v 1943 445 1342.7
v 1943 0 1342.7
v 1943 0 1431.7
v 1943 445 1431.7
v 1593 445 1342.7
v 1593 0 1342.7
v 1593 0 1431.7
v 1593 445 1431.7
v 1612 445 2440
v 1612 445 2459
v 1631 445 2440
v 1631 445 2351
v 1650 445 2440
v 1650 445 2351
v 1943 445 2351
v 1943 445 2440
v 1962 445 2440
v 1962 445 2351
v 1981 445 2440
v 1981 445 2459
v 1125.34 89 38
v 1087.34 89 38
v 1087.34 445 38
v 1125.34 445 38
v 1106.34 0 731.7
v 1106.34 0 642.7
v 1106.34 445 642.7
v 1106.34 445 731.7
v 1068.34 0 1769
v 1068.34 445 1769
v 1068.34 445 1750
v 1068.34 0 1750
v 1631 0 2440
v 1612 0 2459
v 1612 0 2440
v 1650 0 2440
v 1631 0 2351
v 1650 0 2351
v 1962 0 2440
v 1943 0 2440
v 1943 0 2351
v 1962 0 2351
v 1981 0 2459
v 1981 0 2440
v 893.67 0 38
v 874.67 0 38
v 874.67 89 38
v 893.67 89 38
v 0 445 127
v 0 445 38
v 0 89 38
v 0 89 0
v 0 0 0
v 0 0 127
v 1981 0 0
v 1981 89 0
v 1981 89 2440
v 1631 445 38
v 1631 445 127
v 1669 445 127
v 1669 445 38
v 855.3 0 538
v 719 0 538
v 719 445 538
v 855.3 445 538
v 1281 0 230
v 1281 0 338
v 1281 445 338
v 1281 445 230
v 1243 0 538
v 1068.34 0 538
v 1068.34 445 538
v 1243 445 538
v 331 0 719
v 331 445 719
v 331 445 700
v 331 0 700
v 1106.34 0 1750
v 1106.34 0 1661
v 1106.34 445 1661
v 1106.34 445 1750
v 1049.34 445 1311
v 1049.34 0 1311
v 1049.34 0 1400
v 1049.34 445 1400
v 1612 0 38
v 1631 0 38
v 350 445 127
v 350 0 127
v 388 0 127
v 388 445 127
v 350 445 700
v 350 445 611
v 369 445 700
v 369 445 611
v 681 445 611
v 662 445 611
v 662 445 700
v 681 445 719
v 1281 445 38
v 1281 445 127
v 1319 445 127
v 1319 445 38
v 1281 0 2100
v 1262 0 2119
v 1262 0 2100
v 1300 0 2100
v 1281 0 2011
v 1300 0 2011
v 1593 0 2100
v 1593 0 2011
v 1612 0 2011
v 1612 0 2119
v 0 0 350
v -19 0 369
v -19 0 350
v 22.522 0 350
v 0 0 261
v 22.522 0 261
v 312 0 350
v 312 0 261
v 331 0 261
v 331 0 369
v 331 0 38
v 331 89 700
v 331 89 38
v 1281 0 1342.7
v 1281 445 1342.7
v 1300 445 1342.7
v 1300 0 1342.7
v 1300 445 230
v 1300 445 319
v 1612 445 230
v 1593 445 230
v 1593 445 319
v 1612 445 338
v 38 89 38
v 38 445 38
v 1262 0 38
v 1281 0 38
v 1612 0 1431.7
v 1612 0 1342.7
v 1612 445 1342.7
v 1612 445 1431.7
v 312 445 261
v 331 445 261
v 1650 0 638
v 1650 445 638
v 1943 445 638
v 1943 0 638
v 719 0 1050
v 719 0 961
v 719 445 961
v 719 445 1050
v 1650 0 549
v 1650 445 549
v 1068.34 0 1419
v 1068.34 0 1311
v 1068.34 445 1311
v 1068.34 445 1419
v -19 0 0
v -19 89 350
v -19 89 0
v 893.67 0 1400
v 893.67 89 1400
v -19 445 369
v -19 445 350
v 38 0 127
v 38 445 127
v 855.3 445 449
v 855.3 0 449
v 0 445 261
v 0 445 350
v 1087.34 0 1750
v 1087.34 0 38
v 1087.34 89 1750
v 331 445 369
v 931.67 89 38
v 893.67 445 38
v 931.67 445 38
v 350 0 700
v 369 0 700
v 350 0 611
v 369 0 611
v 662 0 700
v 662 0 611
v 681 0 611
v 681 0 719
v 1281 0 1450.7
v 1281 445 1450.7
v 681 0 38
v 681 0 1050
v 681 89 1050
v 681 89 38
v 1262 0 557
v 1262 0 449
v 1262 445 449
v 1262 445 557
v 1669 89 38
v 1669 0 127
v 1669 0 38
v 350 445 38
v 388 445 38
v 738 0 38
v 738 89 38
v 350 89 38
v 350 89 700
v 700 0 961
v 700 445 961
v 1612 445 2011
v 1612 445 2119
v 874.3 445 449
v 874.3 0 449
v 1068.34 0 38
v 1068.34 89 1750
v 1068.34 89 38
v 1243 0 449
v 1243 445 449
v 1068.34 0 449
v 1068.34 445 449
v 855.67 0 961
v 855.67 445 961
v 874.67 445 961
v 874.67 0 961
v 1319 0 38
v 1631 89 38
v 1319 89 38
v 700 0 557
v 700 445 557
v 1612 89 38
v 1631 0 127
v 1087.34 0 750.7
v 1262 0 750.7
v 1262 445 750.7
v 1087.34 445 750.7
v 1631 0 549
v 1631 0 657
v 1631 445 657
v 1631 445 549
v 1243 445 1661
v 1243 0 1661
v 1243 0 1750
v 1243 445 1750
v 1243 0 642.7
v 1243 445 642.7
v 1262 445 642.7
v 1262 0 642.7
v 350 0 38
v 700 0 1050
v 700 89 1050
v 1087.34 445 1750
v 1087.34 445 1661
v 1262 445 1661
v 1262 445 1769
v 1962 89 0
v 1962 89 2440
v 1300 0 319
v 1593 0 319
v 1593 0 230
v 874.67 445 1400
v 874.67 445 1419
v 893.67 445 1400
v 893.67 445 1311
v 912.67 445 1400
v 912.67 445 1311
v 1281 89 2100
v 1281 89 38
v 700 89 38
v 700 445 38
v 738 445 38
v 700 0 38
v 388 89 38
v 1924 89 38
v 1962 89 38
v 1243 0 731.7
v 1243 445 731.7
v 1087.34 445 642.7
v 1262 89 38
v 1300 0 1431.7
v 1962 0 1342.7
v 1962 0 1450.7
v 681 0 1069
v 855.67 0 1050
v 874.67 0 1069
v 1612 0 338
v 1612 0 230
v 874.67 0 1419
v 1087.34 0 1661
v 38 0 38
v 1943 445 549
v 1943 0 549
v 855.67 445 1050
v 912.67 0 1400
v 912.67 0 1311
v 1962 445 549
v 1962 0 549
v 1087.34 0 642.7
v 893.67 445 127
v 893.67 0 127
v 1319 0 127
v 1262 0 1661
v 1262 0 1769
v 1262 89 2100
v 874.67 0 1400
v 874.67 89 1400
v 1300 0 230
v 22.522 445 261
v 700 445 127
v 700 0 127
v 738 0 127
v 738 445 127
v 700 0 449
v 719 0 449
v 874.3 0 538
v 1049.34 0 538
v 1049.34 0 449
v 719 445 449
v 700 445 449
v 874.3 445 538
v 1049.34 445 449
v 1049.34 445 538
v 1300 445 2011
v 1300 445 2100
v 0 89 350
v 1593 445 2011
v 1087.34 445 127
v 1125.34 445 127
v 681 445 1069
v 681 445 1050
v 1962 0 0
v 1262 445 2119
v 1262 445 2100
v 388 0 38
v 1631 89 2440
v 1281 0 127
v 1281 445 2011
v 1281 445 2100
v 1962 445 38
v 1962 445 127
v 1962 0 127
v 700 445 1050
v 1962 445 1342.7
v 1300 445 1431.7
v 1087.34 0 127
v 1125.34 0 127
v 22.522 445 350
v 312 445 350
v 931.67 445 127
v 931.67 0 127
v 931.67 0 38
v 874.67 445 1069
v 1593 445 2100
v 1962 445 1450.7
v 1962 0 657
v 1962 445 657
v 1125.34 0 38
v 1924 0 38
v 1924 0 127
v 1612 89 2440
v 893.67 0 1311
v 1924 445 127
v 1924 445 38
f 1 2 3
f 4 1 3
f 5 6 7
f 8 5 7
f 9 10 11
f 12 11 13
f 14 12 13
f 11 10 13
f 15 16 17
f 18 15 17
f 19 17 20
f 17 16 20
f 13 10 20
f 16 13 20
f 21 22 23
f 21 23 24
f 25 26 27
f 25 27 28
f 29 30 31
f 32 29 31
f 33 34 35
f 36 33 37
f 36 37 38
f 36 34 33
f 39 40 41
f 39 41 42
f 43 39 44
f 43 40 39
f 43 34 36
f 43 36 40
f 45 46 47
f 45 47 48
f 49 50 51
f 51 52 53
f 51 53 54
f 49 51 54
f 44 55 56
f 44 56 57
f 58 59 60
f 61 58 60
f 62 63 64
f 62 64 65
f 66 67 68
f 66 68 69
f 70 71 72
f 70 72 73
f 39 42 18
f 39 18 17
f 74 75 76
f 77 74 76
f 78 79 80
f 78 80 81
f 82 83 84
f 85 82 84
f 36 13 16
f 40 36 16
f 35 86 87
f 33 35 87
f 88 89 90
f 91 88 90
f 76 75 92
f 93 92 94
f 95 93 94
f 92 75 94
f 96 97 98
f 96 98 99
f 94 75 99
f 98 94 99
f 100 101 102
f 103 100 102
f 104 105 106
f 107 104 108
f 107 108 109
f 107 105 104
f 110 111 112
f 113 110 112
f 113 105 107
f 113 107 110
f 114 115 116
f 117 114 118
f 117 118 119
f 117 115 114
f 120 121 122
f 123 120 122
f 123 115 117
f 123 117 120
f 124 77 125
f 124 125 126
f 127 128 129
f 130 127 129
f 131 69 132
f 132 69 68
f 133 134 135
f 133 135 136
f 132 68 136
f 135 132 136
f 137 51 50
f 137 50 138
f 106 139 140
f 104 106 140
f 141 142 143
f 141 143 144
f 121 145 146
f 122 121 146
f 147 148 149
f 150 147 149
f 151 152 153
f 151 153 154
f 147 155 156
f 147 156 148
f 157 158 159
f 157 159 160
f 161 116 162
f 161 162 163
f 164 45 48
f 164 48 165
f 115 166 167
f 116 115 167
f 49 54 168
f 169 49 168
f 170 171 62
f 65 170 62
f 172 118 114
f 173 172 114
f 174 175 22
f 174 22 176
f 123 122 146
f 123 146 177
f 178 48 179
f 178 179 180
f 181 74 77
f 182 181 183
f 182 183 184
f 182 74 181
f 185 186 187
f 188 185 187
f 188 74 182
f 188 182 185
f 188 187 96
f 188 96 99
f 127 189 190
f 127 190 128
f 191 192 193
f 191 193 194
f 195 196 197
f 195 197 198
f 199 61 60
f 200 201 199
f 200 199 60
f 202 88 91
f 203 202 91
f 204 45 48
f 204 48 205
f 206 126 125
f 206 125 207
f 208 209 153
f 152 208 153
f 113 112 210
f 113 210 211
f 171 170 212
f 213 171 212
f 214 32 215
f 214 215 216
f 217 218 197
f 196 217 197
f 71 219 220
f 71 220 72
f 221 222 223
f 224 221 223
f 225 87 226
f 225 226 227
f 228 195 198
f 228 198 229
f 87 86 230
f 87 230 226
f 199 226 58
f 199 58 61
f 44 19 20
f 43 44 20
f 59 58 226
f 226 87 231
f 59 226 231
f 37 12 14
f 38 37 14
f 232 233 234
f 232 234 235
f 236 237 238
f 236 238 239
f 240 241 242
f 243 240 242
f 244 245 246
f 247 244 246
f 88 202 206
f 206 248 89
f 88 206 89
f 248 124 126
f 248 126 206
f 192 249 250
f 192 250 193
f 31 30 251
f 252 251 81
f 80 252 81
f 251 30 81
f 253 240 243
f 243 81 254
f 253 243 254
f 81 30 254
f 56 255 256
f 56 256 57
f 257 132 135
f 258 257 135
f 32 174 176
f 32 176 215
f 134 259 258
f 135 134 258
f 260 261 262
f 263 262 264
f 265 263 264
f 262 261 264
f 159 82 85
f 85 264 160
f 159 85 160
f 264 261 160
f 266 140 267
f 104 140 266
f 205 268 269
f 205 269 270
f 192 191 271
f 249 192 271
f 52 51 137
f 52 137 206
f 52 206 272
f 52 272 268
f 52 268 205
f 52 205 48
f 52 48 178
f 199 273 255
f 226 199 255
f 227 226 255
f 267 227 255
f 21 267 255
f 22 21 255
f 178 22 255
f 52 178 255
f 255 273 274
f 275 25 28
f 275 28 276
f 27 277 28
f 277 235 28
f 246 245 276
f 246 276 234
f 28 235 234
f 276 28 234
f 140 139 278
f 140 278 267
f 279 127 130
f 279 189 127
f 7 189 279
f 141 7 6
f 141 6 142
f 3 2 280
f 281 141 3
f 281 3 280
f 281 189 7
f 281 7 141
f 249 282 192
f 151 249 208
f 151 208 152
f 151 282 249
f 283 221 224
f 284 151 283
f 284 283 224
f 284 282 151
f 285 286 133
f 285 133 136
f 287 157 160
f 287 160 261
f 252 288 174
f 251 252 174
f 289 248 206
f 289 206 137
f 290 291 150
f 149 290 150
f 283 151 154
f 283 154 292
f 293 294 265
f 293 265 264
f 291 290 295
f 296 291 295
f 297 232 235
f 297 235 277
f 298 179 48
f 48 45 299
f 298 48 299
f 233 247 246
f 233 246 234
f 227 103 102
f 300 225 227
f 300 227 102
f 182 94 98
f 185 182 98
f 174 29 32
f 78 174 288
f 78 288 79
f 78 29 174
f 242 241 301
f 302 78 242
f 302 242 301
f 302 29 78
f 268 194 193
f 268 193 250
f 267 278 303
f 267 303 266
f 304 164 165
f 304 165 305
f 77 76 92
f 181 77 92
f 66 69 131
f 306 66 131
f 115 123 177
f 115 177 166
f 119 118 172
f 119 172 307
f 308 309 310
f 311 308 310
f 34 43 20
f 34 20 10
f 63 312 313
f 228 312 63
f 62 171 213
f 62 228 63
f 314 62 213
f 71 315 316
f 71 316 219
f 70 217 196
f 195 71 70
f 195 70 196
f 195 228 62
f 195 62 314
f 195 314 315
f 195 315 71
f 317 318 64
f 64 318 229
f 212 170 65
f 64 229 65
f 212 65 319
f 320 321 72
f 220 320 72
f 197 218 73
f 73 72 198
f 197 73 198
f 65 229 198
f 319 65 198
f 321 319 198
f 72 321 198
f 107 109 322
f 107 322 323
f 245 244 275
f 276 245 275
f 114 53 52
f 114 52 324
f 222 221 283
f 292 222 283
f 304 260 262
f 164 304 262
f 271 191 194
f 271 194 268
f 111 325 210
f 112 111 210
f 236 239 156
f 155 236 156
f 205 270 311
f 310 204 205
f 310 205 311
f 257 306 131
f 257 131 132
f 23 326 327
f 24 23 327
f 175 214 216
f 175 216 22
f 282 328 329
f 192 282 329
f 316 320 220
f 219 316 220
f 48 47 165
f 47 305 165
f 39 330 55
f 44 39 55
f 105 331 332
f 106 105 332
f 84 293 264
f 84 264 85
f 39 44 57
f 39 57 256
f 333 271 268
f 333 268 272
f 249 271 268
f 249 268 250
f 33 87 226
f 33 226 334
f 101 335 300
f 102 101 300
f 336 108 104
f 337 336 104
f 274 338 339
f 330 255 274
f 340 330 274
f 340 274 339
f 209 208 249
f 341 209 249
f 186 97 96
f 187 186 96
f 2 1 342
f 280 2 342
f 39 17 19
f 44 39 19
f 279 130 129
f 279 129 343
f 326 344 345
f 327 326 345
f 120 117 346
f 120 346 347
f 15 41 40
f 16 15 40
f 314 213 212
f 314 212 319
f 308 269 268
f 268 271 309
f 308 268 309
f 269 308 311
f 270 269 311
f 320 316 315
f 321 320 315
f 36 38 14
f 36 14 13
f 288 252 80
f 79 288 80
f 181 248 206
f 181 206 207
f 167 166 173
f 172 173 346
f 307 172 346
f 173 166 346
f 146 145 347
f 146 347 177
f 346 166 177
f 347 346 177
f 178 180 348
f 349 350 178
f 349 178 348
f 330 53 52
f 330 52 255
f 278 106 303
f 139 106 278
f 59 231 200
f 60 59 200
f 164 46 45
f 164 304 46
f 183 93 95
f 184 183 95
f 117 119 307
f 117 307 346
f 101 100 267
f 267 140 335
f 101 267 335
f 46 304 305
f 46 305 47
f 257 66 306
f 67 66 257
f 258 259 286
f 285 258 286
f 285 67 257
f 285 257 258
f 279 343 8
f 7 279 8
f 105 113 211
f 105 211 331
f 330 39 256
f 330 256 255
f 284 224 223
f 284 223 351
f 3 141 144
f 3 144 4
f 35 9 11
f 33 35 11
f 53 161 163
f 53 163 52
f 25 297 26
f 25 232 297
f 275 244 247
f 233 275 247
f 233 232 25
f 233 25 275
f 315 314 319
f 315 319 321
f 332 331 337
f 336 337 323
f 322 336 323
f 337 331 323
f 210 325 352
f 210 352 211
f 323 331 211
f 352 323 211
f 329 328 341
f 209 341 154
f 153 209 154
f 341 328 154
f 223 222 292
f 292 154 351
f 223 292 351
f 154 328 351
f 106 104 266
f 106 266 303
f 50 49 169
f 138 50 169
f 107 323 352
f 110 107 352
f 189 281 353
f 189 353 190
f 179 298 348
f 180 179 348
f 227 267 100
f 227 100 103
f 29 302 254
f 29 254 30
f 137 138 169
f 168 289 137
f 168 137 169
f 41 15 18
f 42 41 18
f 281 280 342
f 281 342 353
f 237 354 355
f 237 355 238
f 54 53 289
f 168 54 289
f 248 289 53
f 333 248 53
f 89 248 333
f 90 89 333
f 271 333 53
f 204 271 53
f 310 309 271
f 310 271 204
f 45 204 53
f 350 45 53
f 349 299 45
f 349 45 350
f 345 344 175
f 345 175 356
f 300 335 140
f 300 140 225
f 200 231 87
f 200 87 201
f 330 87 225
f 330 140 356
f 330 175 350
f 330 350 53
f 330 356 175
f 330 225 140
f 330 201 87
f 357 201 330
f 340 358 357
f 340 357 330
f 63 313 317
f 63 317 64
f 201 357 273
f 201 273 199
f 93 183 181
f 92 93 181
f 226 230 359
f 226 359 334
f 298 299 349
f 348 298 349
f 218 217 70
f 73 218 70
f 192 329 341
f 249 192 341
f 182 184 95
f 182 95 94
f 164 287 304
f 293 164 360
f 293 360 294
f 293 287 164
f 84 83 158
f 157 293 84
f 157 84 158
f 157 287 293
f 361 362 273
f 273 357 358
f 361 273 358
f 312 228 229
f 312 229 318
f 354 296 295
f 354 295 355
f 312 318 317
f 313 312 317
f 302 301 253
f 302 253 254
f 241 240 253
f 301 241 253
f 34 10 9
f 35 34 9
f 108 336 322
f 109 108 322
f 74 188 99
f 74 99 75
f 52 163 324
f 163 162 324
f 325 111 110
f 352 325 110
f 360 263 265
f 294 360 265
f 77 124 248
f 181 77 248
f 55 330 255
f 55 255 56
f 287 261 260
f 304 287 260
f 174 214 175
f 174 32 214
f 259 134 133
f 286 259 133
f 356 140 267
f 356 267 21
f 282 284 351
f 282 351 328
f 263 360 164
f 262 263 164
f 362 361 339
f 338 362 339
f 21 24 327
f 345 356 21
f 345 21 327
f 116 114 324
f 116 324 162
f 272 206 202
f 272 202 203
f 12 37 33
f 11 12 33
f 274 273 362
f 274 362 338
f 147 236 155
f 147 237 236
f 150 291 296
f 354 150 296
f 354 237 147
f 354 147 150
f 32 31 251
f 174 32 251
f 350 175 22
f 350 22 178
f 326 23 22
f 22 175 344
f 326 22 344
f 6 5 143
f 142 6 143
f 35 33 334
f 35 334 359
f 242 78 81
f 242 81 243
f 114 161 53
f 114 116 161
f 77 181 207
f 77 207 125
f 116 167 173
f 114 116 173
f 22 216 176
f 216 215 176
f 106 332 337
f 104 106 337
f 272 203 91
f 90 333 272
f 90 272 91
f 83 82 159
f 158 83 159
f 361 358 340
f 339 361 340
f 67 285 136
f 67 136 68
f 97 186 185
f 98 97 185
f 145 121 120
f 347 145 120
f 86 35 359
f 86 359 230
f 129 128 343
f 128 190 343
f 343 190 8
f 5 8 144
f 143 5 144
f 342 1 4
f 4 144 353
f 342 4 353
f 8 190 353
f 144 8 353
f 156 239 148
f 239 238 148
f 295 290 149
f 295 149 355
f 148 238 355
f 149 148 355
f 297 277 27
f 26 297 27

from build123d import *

# Parameters (mm, degrees)
F1_DEPTH = 89
F0_W     = 38
F0_H     = 89
F2_DEPTH = 445
F0_W_2   = 19
F0_H_2   = 19
F0_W_3   = 22.522257641
F3_DEPTH = 89


with BuildPart() as f1:
    # F0 (on Front) → F1 (new body)
    with BuildSketch(Plane.XZ):
        Polygon((0, 38), (0, 0), (1962, 0), (1962, 38), (1924, 38), (1669, 38), (1631, 38), (1612, 38), (1319, 38), (1281, 38), (1262, 38), (1125.34, 38), (1087.34, 38), (1068.34, 38), (931.67, 38), (893.67, 38), (874.67, 38), (738, 38), (700, 38), (681, 38), (388, 38), (350, 38), (331, 38), (38, 38), align=None)
    extrude(amount=-F1_DEPTH)

    # F0 (on Front) → F2 (join)
    with BuildSketch(Plane.XZ):
        with Locations((19, 82.5)):
            Rectangle(F0_W, F0_H)
        with Locations((369, 82.5)):
            Rectangle(F0_W, F0_H)
        with Locations((719, 82.5)):
            Rectangle(F0_W, F0_H)
        with Locations((912.67, 82.5)):
            Rectangle(F0_W, F0_H)
        with Locations((1106.34, 82.5)):
            Rectangle(F0_W, F0_H)
        with Locations((1300, 82.5)):
            Rectangle(F0_W, F0_H)
        with Locations((1650, 82.5)):
            Rectangle(F0_W, F0_H)
        with Locations((1943, 82.5)):
            Rectangle(F0_W, F0_H)
    extrude(amount=-F2_DEPTH)


with BuildPart() as f2:
    # F0 (on Front) → F2, piece 2 (new body)
    with BuildSketch(Plane.XZ):
        with Locations((1602.5, 274.5)):
            Rectangle(F0_W_2, F0_H)
        with Locations((1290.5, 274.5)):
            Rectangle(F0_W_2, F0_H)
        Polygon((1593, 319), (1612, 319), (1612, 338), (1281, 338), (1281, 319), (1300, 319), align=None)
    extrude(amount=-F2_DEPTH)


with BuildPart() as f2b:
    # F0 (on Front) → F2, piece 3 (new body)
    with BuildSketch(Plane.XZ):
        with Locations((1252.5, 493.5)):
            Rectangle(F0_W_2, F0_H)
        with Locations((1058.84, 493.5)):
            Rectangle(F0_W_2, F0_H)
        with Locations((864.8003072739, 493.5)):
            Rectangle(F0_W_2, F0_H)
        with Locations((709.5, 493.5)):
            Rectangle(F0_W_2, F0_H)
        Polygon((1243, 538), (1262, 538), (1262, 557), (1087.34, 557), (1087.34, 538), align=None)
        with Locations((1077.84, 547.5)):
            Rectangle(F0_W_2, F0_H_2)
        Polygon((893.67, 557), (893.67, 538), (1049.34, 538), (1068.34, 538), (1068.34, 557), align=None)
        with Locations((884.17, 547.5)):
            Rectangle(F0_W_2, F0_H_2)
        Polygon((874.3003072739, 538), (874.67, 538), (874.67, 557), (700, 557), (700, 538), (719, 538), (855.3003072739, 538), align=None)
    extrude(amount=-F2_DEPTH)


with BuildPart() as f2c:
    # F0 (on Front) → F2, piece 4 (new body)
    with BuildSketch(Plane.XZ):
        with Locations((321.5, 305.5)):
            Rectangle(F0_W_2, F0_H)
        with Locations((11.2611288205, 305.5)):
            Rectangle(F0_W_3, F0_H)
        Polygon((-19, 369), (-19, 350), (0, 350), (22.522257641, 350), (312, 350), (331, 350), (331, 369), align=None)
    extrude(amount=-F2_DEPTH)


with BuildPart() as f2d:
    # F0 (on Front) → F2, piece 5 (new body)
    with BuildSketch(Plane.XZ):
        with Locations((359.5, 655.5)):
            Rectangle(F0_W_2, F0_H)
        with Locations((671.5, 655.5)):
            Rectangle(F0_W_2, F0_H)
        Polygon((331, 719), (331, 700), (350, 700), (369, 700), (662, 700), (681, 700), (681, 719), align=None)
    extrude(amount=-F2_DEPTH)


with BuildPart() as f2e:
    # F0 (on Front) → F2, piece 6 (new body)
    with BuildSketch(Plane.XZ):
        with Locations((1096.84, 687.2)):
            Rectangle(F0_W_2, F0_H)
        with Locations((1252.5, 687.2)):
            Rectangle(F0_W_2, F0_H)
        Polygon((1262, 731.7), (1262, 750.7), (1087.34, 750.7), (1087.34, 731.7), (1106.34, 731.7), (1243, 731.7), align=None)
    extrude(amount=-F2_DEPTH)


with BuildPart() as f2f:
    # F0 (on Front) → F2, piece 7 (new body)
    with BuildSketch(Plane.XZ):
        with Locations((1640.5, 593.5)):
            Rectangle(F0_W_2, F0_H)
        with Locations((1952.5, 593.5)):
            Rectangle(F0_W_2, F0_H)
        Polygon((1943, 638), (1962, 638), (1962, 657), (1631, 657), (1631, 638), (1650, 638), align=None)
    extrude(amount=-F2_DEPTH)


with BuildPart() as f2g:
    # F0 (on Front) → F2, piece 8 (new body)
    with BuildSketch(Plane.XZ):
        with Locations((709.5, 1005.5)):
            Rectangle(F0_W_2, F0_H)
        with Locations((865.17, 1005.5)):
            Rectangle(F0_W_2, F0_H)
        Polygon((681, 1069), (681, 1050), (700, 1050), (719, 1050), (855.67, 1050), (874.67, 1050), (874.67, 1069), align=None)
    extrude(amount=-F2_DEPTH)


with BuildPart() as f2h:
    # F0 (on Front) → F2, piece 9 (new body)
    with BuildSketch(Plane.XZ):
        with Locations((903.17, 1355.5)):
            Rectangle(F0_W_2, F0_H)
        with Locations((1058.84, 1355.5)):
            Rectangle(F0_W_2, F0_H)
        Polygon((874.67, 1419), (874.67, 1400), (893.67, 1400), (912.67, 1400), (1049.34, 1400), (1068.34, 1400), (1068.34, 1419), align=None)
    extrude(amount=-F2_DEPTH)


with BuildPart() as f2i:
    # F0 (on Front) → F2, piece 10 (new body)
    with BuildSketch(Plane.XZ):
        with Locations((1290.5, 1387.2)):
            Rectangle(F0_W_2, F0_H)
        with Locations((1602.5, 1387.2)):
            Rectangle(F0_W_2, F0_H)
        with Locations((1952.5, 1387.2)):
            Rectangle(F0_W_2, F0_H)
        Polygon((1612, 1431.7), (1612, 1450.7), (1281, 1450.7), (1281, 1431.7), (1300, 1431.7), (1593, 1431.7), align=None)
        with Locations((1621.5, 1441.2)):
            Rectangle(F0_W_2, F0_H_2)
        Polygon((1962, 1431.7), (1962, 1450.7), (1631, 1450.7), (1631, 1431.7), (1943, 1431.7), align=None)
    extrude(amount=-F2_DEPTH)


with BuildPart() as f2j:
    # F0 (on Front) → F2, piece 11 (new body)
    with BuildSketch(Plane.XZ):
        with Locations((1096.84, 1705.5)):
            Rectangle(F0_W_2, F0_H)
        with Locations((1252.5, 1705.5)):
            Rectangle(F0_W_2, F0_H)
        Polygon((1262, 1750), (1262, 1769), (1068.34, 1769), (1068.34, 1750), (1087.34, 1750), (1106.34, 1750), (1243, 1750), align=None)
    extrude(amount=-F2_DEPTH)


with BuildPart() as f2k:
    # F0 (on Front) → F2, piece 12 (new body)
    with BuildSketch(Plane.XZ):
        with Locations((1290.5, 2055.5)):
            Rectangle(F0_W_2, F0_H)
        with Locations((1602.5, 2055.5)):
            Rectangle(F0_W_2, F0_H)
        Polygon((1612, 2100), (1612, 2119), (1262, 2119), (1262, 2100), (1281, 2100), (1300, 2100), (1593, 2100), align=None)
    extrude(amount=-F2_DEPTH)


with BuildPart() as f2l:
    # F0 (on Front) → F2, piece 13 (new body)
    with BuildSketch(Plane.XZ):
        with Locations((1640.5, 2395.5)):
            Rectangle(F0_W_2, F0_H)
        with Locations((1952.5, 2395.5)):
            Rectangle(F0_W_2, F0_H)
        Polygon((1962, 2440), (1981, 2440), (1981, 2459), (1612, 2459), (1612, 2440), (1631, 2440), (1650, 2440), (1943, 2440), align=None)
    extrude(amount=-F2_DEPTH)


with BuildPart() as f3:
    # F0 (on Front) → F3 (new body)
    with BuildSketch(Plane.XZ):
        Polygon((1962, 38), (1962, 0), (1981, 0), (1981, 2440), (1962, 2440), (1962, 2351), (1962, 1450.7), (1962, 1431.7), (1962, 1342.7), (1962, 657), (1962, 638), (1962, 549), (1962, 127), align=None)
    extrude(amount=-F3_DEPTH)


with BuildPart() as f3b:
    # F0 (on Front) → F3, piece 2 (new body)
    with BuildSketch(Plane.XZ):
        Polygon((-19, 0), (0, 0), (0, 38), (0, 127), (0, 261), (0, 350), (-19, 350), align=None)
    extrude(amount=-F3_DEPTH)


with BuildPart() as f3c:
    # F0 (on Front) → F3, piece 3 (new body)
    with BuildSketch(Plane.XZ):
        Polygon((331, 261), (331, 38), (350, 38), (350, 127), (350, 611), (350, 700), (331, 700), (331, 369), (331, 350), align=None)
    extrude(amount=-F3_DEPTH)


with BuildPart() as f3d:
    # F0 (on Front) → F3, piece 4 (new body)
    with BuildSketch(Plane.XZ):
        Polygon((681, 611), (681, 38), (700, 38), (700, 127), (700, 449), (700, 538), (700, 557), (700, 961), (700, 1050), (681, 1050), (681, 719), (681, 700), align=None)
    extrude(amount=-F3_DEPTH)


with BuildPart() as f3e:
    # F0 (on Front) → F3, piece 5 (new body)
    with BuildSketch(Plane.XZ):
        Polygon((874.67, 538), (874.67, 38), (893.67, 38), (893.67, 127), (893.67, 538), align=None)
        Polygon((874.67, 1400), (874.67, 1069), (874.67, 1050), (874.67, 961), (874.67, 557), (893.67, 557), (893.67, 1311), (893.67, 1400), align=None)
        with Locations((884.17, 547.5)):
            Rectangle(F0_W_2, F0_H_2)
    extrude(amount=-F3_DEPTH)


with BuildPart() as f3f:
    # F0 (on Front) → F3, piece 6 (new body)
    with BuildSketch(Plane.XZ):
        Polygon((1068.34, 38), (1087.34, 38), (1087.34, 127), (1087.34, 538), (1068.34, 538), (1068.34, 449), align=None)
        with Locations((1077.84, 547.5)):
            Rectangle(F0_W_2, F0_H_2)
        Polygon((1087.34, 1750), (1068.34, 1750), (1068.34, 1419), (1068.34, 1400), (1068.34, 1311), (1068.34, 557), (1087.34, 557), (1087.34, 642.7), (1087.34, 731.7), (1087.34, 750.7), (1087.34, 1661), align=None)
    extrude(amount=-F3_DEPTH)


with BuildPart() as f3g:
    # F0 (on Front) → F3, piece 7 (new body)
    with BuildSketch(Plane.XZ):
        Polygon((1262, 38), (1281, 38), (1281, 127), (1281, 230), (1281, 319), (1281, 338), (1281, 1342.7), (1281, 1431.7), (1281, 1450.7), (1281, 2011), (1281, 2100), (1262, 2100), (1262, 1769), (1262, 1750), (1262, 1661), (1262, 750.7), (1262, 731.7), (1262, 642.7), (1262, 557), (1262, 538), (1262, 449), align=None)
    extrude(amount=-F3_DEPTH)


with BuildPart() as f3h:
    # F0 (on Front) → F3, piece 8 (new body)
    with BuildSketch(Plane.XZ):
        Polygon((1612, 38), (1631, 38), (1631, 127), (1631, 549), (1631, 638), (1631, 657), (1631, 1431.7), (1612, 1431.7), (1612, 1342.7), (1612, 338), (1612, 319), (1612, 230), align=None)
        with Locations((1621.5, 1441.2)):
            Rectangle(F0_W_2, F0_H_2)
        Polygon((1631, 2440), (1612, 2440), (1612, 2119), (1612, 2100), (1612, 2011), (1612, 1450.7), (1631, 1450.7), (1631, 2351), align=None)
    extrude(amount=-F3_DEPTH)


solid = Compound([f1.part, f2.part, f2b.part, f2c.part, f2d.part, f2e.part, f2f.part, f2g.part, f2h.part, f2i.part, f2j.part, f2k.part, f2l.part, f3.part, f3b.part, f3c.part, f3d.part, f3e.part, f3f.part, f3g.part, f3h.part])
